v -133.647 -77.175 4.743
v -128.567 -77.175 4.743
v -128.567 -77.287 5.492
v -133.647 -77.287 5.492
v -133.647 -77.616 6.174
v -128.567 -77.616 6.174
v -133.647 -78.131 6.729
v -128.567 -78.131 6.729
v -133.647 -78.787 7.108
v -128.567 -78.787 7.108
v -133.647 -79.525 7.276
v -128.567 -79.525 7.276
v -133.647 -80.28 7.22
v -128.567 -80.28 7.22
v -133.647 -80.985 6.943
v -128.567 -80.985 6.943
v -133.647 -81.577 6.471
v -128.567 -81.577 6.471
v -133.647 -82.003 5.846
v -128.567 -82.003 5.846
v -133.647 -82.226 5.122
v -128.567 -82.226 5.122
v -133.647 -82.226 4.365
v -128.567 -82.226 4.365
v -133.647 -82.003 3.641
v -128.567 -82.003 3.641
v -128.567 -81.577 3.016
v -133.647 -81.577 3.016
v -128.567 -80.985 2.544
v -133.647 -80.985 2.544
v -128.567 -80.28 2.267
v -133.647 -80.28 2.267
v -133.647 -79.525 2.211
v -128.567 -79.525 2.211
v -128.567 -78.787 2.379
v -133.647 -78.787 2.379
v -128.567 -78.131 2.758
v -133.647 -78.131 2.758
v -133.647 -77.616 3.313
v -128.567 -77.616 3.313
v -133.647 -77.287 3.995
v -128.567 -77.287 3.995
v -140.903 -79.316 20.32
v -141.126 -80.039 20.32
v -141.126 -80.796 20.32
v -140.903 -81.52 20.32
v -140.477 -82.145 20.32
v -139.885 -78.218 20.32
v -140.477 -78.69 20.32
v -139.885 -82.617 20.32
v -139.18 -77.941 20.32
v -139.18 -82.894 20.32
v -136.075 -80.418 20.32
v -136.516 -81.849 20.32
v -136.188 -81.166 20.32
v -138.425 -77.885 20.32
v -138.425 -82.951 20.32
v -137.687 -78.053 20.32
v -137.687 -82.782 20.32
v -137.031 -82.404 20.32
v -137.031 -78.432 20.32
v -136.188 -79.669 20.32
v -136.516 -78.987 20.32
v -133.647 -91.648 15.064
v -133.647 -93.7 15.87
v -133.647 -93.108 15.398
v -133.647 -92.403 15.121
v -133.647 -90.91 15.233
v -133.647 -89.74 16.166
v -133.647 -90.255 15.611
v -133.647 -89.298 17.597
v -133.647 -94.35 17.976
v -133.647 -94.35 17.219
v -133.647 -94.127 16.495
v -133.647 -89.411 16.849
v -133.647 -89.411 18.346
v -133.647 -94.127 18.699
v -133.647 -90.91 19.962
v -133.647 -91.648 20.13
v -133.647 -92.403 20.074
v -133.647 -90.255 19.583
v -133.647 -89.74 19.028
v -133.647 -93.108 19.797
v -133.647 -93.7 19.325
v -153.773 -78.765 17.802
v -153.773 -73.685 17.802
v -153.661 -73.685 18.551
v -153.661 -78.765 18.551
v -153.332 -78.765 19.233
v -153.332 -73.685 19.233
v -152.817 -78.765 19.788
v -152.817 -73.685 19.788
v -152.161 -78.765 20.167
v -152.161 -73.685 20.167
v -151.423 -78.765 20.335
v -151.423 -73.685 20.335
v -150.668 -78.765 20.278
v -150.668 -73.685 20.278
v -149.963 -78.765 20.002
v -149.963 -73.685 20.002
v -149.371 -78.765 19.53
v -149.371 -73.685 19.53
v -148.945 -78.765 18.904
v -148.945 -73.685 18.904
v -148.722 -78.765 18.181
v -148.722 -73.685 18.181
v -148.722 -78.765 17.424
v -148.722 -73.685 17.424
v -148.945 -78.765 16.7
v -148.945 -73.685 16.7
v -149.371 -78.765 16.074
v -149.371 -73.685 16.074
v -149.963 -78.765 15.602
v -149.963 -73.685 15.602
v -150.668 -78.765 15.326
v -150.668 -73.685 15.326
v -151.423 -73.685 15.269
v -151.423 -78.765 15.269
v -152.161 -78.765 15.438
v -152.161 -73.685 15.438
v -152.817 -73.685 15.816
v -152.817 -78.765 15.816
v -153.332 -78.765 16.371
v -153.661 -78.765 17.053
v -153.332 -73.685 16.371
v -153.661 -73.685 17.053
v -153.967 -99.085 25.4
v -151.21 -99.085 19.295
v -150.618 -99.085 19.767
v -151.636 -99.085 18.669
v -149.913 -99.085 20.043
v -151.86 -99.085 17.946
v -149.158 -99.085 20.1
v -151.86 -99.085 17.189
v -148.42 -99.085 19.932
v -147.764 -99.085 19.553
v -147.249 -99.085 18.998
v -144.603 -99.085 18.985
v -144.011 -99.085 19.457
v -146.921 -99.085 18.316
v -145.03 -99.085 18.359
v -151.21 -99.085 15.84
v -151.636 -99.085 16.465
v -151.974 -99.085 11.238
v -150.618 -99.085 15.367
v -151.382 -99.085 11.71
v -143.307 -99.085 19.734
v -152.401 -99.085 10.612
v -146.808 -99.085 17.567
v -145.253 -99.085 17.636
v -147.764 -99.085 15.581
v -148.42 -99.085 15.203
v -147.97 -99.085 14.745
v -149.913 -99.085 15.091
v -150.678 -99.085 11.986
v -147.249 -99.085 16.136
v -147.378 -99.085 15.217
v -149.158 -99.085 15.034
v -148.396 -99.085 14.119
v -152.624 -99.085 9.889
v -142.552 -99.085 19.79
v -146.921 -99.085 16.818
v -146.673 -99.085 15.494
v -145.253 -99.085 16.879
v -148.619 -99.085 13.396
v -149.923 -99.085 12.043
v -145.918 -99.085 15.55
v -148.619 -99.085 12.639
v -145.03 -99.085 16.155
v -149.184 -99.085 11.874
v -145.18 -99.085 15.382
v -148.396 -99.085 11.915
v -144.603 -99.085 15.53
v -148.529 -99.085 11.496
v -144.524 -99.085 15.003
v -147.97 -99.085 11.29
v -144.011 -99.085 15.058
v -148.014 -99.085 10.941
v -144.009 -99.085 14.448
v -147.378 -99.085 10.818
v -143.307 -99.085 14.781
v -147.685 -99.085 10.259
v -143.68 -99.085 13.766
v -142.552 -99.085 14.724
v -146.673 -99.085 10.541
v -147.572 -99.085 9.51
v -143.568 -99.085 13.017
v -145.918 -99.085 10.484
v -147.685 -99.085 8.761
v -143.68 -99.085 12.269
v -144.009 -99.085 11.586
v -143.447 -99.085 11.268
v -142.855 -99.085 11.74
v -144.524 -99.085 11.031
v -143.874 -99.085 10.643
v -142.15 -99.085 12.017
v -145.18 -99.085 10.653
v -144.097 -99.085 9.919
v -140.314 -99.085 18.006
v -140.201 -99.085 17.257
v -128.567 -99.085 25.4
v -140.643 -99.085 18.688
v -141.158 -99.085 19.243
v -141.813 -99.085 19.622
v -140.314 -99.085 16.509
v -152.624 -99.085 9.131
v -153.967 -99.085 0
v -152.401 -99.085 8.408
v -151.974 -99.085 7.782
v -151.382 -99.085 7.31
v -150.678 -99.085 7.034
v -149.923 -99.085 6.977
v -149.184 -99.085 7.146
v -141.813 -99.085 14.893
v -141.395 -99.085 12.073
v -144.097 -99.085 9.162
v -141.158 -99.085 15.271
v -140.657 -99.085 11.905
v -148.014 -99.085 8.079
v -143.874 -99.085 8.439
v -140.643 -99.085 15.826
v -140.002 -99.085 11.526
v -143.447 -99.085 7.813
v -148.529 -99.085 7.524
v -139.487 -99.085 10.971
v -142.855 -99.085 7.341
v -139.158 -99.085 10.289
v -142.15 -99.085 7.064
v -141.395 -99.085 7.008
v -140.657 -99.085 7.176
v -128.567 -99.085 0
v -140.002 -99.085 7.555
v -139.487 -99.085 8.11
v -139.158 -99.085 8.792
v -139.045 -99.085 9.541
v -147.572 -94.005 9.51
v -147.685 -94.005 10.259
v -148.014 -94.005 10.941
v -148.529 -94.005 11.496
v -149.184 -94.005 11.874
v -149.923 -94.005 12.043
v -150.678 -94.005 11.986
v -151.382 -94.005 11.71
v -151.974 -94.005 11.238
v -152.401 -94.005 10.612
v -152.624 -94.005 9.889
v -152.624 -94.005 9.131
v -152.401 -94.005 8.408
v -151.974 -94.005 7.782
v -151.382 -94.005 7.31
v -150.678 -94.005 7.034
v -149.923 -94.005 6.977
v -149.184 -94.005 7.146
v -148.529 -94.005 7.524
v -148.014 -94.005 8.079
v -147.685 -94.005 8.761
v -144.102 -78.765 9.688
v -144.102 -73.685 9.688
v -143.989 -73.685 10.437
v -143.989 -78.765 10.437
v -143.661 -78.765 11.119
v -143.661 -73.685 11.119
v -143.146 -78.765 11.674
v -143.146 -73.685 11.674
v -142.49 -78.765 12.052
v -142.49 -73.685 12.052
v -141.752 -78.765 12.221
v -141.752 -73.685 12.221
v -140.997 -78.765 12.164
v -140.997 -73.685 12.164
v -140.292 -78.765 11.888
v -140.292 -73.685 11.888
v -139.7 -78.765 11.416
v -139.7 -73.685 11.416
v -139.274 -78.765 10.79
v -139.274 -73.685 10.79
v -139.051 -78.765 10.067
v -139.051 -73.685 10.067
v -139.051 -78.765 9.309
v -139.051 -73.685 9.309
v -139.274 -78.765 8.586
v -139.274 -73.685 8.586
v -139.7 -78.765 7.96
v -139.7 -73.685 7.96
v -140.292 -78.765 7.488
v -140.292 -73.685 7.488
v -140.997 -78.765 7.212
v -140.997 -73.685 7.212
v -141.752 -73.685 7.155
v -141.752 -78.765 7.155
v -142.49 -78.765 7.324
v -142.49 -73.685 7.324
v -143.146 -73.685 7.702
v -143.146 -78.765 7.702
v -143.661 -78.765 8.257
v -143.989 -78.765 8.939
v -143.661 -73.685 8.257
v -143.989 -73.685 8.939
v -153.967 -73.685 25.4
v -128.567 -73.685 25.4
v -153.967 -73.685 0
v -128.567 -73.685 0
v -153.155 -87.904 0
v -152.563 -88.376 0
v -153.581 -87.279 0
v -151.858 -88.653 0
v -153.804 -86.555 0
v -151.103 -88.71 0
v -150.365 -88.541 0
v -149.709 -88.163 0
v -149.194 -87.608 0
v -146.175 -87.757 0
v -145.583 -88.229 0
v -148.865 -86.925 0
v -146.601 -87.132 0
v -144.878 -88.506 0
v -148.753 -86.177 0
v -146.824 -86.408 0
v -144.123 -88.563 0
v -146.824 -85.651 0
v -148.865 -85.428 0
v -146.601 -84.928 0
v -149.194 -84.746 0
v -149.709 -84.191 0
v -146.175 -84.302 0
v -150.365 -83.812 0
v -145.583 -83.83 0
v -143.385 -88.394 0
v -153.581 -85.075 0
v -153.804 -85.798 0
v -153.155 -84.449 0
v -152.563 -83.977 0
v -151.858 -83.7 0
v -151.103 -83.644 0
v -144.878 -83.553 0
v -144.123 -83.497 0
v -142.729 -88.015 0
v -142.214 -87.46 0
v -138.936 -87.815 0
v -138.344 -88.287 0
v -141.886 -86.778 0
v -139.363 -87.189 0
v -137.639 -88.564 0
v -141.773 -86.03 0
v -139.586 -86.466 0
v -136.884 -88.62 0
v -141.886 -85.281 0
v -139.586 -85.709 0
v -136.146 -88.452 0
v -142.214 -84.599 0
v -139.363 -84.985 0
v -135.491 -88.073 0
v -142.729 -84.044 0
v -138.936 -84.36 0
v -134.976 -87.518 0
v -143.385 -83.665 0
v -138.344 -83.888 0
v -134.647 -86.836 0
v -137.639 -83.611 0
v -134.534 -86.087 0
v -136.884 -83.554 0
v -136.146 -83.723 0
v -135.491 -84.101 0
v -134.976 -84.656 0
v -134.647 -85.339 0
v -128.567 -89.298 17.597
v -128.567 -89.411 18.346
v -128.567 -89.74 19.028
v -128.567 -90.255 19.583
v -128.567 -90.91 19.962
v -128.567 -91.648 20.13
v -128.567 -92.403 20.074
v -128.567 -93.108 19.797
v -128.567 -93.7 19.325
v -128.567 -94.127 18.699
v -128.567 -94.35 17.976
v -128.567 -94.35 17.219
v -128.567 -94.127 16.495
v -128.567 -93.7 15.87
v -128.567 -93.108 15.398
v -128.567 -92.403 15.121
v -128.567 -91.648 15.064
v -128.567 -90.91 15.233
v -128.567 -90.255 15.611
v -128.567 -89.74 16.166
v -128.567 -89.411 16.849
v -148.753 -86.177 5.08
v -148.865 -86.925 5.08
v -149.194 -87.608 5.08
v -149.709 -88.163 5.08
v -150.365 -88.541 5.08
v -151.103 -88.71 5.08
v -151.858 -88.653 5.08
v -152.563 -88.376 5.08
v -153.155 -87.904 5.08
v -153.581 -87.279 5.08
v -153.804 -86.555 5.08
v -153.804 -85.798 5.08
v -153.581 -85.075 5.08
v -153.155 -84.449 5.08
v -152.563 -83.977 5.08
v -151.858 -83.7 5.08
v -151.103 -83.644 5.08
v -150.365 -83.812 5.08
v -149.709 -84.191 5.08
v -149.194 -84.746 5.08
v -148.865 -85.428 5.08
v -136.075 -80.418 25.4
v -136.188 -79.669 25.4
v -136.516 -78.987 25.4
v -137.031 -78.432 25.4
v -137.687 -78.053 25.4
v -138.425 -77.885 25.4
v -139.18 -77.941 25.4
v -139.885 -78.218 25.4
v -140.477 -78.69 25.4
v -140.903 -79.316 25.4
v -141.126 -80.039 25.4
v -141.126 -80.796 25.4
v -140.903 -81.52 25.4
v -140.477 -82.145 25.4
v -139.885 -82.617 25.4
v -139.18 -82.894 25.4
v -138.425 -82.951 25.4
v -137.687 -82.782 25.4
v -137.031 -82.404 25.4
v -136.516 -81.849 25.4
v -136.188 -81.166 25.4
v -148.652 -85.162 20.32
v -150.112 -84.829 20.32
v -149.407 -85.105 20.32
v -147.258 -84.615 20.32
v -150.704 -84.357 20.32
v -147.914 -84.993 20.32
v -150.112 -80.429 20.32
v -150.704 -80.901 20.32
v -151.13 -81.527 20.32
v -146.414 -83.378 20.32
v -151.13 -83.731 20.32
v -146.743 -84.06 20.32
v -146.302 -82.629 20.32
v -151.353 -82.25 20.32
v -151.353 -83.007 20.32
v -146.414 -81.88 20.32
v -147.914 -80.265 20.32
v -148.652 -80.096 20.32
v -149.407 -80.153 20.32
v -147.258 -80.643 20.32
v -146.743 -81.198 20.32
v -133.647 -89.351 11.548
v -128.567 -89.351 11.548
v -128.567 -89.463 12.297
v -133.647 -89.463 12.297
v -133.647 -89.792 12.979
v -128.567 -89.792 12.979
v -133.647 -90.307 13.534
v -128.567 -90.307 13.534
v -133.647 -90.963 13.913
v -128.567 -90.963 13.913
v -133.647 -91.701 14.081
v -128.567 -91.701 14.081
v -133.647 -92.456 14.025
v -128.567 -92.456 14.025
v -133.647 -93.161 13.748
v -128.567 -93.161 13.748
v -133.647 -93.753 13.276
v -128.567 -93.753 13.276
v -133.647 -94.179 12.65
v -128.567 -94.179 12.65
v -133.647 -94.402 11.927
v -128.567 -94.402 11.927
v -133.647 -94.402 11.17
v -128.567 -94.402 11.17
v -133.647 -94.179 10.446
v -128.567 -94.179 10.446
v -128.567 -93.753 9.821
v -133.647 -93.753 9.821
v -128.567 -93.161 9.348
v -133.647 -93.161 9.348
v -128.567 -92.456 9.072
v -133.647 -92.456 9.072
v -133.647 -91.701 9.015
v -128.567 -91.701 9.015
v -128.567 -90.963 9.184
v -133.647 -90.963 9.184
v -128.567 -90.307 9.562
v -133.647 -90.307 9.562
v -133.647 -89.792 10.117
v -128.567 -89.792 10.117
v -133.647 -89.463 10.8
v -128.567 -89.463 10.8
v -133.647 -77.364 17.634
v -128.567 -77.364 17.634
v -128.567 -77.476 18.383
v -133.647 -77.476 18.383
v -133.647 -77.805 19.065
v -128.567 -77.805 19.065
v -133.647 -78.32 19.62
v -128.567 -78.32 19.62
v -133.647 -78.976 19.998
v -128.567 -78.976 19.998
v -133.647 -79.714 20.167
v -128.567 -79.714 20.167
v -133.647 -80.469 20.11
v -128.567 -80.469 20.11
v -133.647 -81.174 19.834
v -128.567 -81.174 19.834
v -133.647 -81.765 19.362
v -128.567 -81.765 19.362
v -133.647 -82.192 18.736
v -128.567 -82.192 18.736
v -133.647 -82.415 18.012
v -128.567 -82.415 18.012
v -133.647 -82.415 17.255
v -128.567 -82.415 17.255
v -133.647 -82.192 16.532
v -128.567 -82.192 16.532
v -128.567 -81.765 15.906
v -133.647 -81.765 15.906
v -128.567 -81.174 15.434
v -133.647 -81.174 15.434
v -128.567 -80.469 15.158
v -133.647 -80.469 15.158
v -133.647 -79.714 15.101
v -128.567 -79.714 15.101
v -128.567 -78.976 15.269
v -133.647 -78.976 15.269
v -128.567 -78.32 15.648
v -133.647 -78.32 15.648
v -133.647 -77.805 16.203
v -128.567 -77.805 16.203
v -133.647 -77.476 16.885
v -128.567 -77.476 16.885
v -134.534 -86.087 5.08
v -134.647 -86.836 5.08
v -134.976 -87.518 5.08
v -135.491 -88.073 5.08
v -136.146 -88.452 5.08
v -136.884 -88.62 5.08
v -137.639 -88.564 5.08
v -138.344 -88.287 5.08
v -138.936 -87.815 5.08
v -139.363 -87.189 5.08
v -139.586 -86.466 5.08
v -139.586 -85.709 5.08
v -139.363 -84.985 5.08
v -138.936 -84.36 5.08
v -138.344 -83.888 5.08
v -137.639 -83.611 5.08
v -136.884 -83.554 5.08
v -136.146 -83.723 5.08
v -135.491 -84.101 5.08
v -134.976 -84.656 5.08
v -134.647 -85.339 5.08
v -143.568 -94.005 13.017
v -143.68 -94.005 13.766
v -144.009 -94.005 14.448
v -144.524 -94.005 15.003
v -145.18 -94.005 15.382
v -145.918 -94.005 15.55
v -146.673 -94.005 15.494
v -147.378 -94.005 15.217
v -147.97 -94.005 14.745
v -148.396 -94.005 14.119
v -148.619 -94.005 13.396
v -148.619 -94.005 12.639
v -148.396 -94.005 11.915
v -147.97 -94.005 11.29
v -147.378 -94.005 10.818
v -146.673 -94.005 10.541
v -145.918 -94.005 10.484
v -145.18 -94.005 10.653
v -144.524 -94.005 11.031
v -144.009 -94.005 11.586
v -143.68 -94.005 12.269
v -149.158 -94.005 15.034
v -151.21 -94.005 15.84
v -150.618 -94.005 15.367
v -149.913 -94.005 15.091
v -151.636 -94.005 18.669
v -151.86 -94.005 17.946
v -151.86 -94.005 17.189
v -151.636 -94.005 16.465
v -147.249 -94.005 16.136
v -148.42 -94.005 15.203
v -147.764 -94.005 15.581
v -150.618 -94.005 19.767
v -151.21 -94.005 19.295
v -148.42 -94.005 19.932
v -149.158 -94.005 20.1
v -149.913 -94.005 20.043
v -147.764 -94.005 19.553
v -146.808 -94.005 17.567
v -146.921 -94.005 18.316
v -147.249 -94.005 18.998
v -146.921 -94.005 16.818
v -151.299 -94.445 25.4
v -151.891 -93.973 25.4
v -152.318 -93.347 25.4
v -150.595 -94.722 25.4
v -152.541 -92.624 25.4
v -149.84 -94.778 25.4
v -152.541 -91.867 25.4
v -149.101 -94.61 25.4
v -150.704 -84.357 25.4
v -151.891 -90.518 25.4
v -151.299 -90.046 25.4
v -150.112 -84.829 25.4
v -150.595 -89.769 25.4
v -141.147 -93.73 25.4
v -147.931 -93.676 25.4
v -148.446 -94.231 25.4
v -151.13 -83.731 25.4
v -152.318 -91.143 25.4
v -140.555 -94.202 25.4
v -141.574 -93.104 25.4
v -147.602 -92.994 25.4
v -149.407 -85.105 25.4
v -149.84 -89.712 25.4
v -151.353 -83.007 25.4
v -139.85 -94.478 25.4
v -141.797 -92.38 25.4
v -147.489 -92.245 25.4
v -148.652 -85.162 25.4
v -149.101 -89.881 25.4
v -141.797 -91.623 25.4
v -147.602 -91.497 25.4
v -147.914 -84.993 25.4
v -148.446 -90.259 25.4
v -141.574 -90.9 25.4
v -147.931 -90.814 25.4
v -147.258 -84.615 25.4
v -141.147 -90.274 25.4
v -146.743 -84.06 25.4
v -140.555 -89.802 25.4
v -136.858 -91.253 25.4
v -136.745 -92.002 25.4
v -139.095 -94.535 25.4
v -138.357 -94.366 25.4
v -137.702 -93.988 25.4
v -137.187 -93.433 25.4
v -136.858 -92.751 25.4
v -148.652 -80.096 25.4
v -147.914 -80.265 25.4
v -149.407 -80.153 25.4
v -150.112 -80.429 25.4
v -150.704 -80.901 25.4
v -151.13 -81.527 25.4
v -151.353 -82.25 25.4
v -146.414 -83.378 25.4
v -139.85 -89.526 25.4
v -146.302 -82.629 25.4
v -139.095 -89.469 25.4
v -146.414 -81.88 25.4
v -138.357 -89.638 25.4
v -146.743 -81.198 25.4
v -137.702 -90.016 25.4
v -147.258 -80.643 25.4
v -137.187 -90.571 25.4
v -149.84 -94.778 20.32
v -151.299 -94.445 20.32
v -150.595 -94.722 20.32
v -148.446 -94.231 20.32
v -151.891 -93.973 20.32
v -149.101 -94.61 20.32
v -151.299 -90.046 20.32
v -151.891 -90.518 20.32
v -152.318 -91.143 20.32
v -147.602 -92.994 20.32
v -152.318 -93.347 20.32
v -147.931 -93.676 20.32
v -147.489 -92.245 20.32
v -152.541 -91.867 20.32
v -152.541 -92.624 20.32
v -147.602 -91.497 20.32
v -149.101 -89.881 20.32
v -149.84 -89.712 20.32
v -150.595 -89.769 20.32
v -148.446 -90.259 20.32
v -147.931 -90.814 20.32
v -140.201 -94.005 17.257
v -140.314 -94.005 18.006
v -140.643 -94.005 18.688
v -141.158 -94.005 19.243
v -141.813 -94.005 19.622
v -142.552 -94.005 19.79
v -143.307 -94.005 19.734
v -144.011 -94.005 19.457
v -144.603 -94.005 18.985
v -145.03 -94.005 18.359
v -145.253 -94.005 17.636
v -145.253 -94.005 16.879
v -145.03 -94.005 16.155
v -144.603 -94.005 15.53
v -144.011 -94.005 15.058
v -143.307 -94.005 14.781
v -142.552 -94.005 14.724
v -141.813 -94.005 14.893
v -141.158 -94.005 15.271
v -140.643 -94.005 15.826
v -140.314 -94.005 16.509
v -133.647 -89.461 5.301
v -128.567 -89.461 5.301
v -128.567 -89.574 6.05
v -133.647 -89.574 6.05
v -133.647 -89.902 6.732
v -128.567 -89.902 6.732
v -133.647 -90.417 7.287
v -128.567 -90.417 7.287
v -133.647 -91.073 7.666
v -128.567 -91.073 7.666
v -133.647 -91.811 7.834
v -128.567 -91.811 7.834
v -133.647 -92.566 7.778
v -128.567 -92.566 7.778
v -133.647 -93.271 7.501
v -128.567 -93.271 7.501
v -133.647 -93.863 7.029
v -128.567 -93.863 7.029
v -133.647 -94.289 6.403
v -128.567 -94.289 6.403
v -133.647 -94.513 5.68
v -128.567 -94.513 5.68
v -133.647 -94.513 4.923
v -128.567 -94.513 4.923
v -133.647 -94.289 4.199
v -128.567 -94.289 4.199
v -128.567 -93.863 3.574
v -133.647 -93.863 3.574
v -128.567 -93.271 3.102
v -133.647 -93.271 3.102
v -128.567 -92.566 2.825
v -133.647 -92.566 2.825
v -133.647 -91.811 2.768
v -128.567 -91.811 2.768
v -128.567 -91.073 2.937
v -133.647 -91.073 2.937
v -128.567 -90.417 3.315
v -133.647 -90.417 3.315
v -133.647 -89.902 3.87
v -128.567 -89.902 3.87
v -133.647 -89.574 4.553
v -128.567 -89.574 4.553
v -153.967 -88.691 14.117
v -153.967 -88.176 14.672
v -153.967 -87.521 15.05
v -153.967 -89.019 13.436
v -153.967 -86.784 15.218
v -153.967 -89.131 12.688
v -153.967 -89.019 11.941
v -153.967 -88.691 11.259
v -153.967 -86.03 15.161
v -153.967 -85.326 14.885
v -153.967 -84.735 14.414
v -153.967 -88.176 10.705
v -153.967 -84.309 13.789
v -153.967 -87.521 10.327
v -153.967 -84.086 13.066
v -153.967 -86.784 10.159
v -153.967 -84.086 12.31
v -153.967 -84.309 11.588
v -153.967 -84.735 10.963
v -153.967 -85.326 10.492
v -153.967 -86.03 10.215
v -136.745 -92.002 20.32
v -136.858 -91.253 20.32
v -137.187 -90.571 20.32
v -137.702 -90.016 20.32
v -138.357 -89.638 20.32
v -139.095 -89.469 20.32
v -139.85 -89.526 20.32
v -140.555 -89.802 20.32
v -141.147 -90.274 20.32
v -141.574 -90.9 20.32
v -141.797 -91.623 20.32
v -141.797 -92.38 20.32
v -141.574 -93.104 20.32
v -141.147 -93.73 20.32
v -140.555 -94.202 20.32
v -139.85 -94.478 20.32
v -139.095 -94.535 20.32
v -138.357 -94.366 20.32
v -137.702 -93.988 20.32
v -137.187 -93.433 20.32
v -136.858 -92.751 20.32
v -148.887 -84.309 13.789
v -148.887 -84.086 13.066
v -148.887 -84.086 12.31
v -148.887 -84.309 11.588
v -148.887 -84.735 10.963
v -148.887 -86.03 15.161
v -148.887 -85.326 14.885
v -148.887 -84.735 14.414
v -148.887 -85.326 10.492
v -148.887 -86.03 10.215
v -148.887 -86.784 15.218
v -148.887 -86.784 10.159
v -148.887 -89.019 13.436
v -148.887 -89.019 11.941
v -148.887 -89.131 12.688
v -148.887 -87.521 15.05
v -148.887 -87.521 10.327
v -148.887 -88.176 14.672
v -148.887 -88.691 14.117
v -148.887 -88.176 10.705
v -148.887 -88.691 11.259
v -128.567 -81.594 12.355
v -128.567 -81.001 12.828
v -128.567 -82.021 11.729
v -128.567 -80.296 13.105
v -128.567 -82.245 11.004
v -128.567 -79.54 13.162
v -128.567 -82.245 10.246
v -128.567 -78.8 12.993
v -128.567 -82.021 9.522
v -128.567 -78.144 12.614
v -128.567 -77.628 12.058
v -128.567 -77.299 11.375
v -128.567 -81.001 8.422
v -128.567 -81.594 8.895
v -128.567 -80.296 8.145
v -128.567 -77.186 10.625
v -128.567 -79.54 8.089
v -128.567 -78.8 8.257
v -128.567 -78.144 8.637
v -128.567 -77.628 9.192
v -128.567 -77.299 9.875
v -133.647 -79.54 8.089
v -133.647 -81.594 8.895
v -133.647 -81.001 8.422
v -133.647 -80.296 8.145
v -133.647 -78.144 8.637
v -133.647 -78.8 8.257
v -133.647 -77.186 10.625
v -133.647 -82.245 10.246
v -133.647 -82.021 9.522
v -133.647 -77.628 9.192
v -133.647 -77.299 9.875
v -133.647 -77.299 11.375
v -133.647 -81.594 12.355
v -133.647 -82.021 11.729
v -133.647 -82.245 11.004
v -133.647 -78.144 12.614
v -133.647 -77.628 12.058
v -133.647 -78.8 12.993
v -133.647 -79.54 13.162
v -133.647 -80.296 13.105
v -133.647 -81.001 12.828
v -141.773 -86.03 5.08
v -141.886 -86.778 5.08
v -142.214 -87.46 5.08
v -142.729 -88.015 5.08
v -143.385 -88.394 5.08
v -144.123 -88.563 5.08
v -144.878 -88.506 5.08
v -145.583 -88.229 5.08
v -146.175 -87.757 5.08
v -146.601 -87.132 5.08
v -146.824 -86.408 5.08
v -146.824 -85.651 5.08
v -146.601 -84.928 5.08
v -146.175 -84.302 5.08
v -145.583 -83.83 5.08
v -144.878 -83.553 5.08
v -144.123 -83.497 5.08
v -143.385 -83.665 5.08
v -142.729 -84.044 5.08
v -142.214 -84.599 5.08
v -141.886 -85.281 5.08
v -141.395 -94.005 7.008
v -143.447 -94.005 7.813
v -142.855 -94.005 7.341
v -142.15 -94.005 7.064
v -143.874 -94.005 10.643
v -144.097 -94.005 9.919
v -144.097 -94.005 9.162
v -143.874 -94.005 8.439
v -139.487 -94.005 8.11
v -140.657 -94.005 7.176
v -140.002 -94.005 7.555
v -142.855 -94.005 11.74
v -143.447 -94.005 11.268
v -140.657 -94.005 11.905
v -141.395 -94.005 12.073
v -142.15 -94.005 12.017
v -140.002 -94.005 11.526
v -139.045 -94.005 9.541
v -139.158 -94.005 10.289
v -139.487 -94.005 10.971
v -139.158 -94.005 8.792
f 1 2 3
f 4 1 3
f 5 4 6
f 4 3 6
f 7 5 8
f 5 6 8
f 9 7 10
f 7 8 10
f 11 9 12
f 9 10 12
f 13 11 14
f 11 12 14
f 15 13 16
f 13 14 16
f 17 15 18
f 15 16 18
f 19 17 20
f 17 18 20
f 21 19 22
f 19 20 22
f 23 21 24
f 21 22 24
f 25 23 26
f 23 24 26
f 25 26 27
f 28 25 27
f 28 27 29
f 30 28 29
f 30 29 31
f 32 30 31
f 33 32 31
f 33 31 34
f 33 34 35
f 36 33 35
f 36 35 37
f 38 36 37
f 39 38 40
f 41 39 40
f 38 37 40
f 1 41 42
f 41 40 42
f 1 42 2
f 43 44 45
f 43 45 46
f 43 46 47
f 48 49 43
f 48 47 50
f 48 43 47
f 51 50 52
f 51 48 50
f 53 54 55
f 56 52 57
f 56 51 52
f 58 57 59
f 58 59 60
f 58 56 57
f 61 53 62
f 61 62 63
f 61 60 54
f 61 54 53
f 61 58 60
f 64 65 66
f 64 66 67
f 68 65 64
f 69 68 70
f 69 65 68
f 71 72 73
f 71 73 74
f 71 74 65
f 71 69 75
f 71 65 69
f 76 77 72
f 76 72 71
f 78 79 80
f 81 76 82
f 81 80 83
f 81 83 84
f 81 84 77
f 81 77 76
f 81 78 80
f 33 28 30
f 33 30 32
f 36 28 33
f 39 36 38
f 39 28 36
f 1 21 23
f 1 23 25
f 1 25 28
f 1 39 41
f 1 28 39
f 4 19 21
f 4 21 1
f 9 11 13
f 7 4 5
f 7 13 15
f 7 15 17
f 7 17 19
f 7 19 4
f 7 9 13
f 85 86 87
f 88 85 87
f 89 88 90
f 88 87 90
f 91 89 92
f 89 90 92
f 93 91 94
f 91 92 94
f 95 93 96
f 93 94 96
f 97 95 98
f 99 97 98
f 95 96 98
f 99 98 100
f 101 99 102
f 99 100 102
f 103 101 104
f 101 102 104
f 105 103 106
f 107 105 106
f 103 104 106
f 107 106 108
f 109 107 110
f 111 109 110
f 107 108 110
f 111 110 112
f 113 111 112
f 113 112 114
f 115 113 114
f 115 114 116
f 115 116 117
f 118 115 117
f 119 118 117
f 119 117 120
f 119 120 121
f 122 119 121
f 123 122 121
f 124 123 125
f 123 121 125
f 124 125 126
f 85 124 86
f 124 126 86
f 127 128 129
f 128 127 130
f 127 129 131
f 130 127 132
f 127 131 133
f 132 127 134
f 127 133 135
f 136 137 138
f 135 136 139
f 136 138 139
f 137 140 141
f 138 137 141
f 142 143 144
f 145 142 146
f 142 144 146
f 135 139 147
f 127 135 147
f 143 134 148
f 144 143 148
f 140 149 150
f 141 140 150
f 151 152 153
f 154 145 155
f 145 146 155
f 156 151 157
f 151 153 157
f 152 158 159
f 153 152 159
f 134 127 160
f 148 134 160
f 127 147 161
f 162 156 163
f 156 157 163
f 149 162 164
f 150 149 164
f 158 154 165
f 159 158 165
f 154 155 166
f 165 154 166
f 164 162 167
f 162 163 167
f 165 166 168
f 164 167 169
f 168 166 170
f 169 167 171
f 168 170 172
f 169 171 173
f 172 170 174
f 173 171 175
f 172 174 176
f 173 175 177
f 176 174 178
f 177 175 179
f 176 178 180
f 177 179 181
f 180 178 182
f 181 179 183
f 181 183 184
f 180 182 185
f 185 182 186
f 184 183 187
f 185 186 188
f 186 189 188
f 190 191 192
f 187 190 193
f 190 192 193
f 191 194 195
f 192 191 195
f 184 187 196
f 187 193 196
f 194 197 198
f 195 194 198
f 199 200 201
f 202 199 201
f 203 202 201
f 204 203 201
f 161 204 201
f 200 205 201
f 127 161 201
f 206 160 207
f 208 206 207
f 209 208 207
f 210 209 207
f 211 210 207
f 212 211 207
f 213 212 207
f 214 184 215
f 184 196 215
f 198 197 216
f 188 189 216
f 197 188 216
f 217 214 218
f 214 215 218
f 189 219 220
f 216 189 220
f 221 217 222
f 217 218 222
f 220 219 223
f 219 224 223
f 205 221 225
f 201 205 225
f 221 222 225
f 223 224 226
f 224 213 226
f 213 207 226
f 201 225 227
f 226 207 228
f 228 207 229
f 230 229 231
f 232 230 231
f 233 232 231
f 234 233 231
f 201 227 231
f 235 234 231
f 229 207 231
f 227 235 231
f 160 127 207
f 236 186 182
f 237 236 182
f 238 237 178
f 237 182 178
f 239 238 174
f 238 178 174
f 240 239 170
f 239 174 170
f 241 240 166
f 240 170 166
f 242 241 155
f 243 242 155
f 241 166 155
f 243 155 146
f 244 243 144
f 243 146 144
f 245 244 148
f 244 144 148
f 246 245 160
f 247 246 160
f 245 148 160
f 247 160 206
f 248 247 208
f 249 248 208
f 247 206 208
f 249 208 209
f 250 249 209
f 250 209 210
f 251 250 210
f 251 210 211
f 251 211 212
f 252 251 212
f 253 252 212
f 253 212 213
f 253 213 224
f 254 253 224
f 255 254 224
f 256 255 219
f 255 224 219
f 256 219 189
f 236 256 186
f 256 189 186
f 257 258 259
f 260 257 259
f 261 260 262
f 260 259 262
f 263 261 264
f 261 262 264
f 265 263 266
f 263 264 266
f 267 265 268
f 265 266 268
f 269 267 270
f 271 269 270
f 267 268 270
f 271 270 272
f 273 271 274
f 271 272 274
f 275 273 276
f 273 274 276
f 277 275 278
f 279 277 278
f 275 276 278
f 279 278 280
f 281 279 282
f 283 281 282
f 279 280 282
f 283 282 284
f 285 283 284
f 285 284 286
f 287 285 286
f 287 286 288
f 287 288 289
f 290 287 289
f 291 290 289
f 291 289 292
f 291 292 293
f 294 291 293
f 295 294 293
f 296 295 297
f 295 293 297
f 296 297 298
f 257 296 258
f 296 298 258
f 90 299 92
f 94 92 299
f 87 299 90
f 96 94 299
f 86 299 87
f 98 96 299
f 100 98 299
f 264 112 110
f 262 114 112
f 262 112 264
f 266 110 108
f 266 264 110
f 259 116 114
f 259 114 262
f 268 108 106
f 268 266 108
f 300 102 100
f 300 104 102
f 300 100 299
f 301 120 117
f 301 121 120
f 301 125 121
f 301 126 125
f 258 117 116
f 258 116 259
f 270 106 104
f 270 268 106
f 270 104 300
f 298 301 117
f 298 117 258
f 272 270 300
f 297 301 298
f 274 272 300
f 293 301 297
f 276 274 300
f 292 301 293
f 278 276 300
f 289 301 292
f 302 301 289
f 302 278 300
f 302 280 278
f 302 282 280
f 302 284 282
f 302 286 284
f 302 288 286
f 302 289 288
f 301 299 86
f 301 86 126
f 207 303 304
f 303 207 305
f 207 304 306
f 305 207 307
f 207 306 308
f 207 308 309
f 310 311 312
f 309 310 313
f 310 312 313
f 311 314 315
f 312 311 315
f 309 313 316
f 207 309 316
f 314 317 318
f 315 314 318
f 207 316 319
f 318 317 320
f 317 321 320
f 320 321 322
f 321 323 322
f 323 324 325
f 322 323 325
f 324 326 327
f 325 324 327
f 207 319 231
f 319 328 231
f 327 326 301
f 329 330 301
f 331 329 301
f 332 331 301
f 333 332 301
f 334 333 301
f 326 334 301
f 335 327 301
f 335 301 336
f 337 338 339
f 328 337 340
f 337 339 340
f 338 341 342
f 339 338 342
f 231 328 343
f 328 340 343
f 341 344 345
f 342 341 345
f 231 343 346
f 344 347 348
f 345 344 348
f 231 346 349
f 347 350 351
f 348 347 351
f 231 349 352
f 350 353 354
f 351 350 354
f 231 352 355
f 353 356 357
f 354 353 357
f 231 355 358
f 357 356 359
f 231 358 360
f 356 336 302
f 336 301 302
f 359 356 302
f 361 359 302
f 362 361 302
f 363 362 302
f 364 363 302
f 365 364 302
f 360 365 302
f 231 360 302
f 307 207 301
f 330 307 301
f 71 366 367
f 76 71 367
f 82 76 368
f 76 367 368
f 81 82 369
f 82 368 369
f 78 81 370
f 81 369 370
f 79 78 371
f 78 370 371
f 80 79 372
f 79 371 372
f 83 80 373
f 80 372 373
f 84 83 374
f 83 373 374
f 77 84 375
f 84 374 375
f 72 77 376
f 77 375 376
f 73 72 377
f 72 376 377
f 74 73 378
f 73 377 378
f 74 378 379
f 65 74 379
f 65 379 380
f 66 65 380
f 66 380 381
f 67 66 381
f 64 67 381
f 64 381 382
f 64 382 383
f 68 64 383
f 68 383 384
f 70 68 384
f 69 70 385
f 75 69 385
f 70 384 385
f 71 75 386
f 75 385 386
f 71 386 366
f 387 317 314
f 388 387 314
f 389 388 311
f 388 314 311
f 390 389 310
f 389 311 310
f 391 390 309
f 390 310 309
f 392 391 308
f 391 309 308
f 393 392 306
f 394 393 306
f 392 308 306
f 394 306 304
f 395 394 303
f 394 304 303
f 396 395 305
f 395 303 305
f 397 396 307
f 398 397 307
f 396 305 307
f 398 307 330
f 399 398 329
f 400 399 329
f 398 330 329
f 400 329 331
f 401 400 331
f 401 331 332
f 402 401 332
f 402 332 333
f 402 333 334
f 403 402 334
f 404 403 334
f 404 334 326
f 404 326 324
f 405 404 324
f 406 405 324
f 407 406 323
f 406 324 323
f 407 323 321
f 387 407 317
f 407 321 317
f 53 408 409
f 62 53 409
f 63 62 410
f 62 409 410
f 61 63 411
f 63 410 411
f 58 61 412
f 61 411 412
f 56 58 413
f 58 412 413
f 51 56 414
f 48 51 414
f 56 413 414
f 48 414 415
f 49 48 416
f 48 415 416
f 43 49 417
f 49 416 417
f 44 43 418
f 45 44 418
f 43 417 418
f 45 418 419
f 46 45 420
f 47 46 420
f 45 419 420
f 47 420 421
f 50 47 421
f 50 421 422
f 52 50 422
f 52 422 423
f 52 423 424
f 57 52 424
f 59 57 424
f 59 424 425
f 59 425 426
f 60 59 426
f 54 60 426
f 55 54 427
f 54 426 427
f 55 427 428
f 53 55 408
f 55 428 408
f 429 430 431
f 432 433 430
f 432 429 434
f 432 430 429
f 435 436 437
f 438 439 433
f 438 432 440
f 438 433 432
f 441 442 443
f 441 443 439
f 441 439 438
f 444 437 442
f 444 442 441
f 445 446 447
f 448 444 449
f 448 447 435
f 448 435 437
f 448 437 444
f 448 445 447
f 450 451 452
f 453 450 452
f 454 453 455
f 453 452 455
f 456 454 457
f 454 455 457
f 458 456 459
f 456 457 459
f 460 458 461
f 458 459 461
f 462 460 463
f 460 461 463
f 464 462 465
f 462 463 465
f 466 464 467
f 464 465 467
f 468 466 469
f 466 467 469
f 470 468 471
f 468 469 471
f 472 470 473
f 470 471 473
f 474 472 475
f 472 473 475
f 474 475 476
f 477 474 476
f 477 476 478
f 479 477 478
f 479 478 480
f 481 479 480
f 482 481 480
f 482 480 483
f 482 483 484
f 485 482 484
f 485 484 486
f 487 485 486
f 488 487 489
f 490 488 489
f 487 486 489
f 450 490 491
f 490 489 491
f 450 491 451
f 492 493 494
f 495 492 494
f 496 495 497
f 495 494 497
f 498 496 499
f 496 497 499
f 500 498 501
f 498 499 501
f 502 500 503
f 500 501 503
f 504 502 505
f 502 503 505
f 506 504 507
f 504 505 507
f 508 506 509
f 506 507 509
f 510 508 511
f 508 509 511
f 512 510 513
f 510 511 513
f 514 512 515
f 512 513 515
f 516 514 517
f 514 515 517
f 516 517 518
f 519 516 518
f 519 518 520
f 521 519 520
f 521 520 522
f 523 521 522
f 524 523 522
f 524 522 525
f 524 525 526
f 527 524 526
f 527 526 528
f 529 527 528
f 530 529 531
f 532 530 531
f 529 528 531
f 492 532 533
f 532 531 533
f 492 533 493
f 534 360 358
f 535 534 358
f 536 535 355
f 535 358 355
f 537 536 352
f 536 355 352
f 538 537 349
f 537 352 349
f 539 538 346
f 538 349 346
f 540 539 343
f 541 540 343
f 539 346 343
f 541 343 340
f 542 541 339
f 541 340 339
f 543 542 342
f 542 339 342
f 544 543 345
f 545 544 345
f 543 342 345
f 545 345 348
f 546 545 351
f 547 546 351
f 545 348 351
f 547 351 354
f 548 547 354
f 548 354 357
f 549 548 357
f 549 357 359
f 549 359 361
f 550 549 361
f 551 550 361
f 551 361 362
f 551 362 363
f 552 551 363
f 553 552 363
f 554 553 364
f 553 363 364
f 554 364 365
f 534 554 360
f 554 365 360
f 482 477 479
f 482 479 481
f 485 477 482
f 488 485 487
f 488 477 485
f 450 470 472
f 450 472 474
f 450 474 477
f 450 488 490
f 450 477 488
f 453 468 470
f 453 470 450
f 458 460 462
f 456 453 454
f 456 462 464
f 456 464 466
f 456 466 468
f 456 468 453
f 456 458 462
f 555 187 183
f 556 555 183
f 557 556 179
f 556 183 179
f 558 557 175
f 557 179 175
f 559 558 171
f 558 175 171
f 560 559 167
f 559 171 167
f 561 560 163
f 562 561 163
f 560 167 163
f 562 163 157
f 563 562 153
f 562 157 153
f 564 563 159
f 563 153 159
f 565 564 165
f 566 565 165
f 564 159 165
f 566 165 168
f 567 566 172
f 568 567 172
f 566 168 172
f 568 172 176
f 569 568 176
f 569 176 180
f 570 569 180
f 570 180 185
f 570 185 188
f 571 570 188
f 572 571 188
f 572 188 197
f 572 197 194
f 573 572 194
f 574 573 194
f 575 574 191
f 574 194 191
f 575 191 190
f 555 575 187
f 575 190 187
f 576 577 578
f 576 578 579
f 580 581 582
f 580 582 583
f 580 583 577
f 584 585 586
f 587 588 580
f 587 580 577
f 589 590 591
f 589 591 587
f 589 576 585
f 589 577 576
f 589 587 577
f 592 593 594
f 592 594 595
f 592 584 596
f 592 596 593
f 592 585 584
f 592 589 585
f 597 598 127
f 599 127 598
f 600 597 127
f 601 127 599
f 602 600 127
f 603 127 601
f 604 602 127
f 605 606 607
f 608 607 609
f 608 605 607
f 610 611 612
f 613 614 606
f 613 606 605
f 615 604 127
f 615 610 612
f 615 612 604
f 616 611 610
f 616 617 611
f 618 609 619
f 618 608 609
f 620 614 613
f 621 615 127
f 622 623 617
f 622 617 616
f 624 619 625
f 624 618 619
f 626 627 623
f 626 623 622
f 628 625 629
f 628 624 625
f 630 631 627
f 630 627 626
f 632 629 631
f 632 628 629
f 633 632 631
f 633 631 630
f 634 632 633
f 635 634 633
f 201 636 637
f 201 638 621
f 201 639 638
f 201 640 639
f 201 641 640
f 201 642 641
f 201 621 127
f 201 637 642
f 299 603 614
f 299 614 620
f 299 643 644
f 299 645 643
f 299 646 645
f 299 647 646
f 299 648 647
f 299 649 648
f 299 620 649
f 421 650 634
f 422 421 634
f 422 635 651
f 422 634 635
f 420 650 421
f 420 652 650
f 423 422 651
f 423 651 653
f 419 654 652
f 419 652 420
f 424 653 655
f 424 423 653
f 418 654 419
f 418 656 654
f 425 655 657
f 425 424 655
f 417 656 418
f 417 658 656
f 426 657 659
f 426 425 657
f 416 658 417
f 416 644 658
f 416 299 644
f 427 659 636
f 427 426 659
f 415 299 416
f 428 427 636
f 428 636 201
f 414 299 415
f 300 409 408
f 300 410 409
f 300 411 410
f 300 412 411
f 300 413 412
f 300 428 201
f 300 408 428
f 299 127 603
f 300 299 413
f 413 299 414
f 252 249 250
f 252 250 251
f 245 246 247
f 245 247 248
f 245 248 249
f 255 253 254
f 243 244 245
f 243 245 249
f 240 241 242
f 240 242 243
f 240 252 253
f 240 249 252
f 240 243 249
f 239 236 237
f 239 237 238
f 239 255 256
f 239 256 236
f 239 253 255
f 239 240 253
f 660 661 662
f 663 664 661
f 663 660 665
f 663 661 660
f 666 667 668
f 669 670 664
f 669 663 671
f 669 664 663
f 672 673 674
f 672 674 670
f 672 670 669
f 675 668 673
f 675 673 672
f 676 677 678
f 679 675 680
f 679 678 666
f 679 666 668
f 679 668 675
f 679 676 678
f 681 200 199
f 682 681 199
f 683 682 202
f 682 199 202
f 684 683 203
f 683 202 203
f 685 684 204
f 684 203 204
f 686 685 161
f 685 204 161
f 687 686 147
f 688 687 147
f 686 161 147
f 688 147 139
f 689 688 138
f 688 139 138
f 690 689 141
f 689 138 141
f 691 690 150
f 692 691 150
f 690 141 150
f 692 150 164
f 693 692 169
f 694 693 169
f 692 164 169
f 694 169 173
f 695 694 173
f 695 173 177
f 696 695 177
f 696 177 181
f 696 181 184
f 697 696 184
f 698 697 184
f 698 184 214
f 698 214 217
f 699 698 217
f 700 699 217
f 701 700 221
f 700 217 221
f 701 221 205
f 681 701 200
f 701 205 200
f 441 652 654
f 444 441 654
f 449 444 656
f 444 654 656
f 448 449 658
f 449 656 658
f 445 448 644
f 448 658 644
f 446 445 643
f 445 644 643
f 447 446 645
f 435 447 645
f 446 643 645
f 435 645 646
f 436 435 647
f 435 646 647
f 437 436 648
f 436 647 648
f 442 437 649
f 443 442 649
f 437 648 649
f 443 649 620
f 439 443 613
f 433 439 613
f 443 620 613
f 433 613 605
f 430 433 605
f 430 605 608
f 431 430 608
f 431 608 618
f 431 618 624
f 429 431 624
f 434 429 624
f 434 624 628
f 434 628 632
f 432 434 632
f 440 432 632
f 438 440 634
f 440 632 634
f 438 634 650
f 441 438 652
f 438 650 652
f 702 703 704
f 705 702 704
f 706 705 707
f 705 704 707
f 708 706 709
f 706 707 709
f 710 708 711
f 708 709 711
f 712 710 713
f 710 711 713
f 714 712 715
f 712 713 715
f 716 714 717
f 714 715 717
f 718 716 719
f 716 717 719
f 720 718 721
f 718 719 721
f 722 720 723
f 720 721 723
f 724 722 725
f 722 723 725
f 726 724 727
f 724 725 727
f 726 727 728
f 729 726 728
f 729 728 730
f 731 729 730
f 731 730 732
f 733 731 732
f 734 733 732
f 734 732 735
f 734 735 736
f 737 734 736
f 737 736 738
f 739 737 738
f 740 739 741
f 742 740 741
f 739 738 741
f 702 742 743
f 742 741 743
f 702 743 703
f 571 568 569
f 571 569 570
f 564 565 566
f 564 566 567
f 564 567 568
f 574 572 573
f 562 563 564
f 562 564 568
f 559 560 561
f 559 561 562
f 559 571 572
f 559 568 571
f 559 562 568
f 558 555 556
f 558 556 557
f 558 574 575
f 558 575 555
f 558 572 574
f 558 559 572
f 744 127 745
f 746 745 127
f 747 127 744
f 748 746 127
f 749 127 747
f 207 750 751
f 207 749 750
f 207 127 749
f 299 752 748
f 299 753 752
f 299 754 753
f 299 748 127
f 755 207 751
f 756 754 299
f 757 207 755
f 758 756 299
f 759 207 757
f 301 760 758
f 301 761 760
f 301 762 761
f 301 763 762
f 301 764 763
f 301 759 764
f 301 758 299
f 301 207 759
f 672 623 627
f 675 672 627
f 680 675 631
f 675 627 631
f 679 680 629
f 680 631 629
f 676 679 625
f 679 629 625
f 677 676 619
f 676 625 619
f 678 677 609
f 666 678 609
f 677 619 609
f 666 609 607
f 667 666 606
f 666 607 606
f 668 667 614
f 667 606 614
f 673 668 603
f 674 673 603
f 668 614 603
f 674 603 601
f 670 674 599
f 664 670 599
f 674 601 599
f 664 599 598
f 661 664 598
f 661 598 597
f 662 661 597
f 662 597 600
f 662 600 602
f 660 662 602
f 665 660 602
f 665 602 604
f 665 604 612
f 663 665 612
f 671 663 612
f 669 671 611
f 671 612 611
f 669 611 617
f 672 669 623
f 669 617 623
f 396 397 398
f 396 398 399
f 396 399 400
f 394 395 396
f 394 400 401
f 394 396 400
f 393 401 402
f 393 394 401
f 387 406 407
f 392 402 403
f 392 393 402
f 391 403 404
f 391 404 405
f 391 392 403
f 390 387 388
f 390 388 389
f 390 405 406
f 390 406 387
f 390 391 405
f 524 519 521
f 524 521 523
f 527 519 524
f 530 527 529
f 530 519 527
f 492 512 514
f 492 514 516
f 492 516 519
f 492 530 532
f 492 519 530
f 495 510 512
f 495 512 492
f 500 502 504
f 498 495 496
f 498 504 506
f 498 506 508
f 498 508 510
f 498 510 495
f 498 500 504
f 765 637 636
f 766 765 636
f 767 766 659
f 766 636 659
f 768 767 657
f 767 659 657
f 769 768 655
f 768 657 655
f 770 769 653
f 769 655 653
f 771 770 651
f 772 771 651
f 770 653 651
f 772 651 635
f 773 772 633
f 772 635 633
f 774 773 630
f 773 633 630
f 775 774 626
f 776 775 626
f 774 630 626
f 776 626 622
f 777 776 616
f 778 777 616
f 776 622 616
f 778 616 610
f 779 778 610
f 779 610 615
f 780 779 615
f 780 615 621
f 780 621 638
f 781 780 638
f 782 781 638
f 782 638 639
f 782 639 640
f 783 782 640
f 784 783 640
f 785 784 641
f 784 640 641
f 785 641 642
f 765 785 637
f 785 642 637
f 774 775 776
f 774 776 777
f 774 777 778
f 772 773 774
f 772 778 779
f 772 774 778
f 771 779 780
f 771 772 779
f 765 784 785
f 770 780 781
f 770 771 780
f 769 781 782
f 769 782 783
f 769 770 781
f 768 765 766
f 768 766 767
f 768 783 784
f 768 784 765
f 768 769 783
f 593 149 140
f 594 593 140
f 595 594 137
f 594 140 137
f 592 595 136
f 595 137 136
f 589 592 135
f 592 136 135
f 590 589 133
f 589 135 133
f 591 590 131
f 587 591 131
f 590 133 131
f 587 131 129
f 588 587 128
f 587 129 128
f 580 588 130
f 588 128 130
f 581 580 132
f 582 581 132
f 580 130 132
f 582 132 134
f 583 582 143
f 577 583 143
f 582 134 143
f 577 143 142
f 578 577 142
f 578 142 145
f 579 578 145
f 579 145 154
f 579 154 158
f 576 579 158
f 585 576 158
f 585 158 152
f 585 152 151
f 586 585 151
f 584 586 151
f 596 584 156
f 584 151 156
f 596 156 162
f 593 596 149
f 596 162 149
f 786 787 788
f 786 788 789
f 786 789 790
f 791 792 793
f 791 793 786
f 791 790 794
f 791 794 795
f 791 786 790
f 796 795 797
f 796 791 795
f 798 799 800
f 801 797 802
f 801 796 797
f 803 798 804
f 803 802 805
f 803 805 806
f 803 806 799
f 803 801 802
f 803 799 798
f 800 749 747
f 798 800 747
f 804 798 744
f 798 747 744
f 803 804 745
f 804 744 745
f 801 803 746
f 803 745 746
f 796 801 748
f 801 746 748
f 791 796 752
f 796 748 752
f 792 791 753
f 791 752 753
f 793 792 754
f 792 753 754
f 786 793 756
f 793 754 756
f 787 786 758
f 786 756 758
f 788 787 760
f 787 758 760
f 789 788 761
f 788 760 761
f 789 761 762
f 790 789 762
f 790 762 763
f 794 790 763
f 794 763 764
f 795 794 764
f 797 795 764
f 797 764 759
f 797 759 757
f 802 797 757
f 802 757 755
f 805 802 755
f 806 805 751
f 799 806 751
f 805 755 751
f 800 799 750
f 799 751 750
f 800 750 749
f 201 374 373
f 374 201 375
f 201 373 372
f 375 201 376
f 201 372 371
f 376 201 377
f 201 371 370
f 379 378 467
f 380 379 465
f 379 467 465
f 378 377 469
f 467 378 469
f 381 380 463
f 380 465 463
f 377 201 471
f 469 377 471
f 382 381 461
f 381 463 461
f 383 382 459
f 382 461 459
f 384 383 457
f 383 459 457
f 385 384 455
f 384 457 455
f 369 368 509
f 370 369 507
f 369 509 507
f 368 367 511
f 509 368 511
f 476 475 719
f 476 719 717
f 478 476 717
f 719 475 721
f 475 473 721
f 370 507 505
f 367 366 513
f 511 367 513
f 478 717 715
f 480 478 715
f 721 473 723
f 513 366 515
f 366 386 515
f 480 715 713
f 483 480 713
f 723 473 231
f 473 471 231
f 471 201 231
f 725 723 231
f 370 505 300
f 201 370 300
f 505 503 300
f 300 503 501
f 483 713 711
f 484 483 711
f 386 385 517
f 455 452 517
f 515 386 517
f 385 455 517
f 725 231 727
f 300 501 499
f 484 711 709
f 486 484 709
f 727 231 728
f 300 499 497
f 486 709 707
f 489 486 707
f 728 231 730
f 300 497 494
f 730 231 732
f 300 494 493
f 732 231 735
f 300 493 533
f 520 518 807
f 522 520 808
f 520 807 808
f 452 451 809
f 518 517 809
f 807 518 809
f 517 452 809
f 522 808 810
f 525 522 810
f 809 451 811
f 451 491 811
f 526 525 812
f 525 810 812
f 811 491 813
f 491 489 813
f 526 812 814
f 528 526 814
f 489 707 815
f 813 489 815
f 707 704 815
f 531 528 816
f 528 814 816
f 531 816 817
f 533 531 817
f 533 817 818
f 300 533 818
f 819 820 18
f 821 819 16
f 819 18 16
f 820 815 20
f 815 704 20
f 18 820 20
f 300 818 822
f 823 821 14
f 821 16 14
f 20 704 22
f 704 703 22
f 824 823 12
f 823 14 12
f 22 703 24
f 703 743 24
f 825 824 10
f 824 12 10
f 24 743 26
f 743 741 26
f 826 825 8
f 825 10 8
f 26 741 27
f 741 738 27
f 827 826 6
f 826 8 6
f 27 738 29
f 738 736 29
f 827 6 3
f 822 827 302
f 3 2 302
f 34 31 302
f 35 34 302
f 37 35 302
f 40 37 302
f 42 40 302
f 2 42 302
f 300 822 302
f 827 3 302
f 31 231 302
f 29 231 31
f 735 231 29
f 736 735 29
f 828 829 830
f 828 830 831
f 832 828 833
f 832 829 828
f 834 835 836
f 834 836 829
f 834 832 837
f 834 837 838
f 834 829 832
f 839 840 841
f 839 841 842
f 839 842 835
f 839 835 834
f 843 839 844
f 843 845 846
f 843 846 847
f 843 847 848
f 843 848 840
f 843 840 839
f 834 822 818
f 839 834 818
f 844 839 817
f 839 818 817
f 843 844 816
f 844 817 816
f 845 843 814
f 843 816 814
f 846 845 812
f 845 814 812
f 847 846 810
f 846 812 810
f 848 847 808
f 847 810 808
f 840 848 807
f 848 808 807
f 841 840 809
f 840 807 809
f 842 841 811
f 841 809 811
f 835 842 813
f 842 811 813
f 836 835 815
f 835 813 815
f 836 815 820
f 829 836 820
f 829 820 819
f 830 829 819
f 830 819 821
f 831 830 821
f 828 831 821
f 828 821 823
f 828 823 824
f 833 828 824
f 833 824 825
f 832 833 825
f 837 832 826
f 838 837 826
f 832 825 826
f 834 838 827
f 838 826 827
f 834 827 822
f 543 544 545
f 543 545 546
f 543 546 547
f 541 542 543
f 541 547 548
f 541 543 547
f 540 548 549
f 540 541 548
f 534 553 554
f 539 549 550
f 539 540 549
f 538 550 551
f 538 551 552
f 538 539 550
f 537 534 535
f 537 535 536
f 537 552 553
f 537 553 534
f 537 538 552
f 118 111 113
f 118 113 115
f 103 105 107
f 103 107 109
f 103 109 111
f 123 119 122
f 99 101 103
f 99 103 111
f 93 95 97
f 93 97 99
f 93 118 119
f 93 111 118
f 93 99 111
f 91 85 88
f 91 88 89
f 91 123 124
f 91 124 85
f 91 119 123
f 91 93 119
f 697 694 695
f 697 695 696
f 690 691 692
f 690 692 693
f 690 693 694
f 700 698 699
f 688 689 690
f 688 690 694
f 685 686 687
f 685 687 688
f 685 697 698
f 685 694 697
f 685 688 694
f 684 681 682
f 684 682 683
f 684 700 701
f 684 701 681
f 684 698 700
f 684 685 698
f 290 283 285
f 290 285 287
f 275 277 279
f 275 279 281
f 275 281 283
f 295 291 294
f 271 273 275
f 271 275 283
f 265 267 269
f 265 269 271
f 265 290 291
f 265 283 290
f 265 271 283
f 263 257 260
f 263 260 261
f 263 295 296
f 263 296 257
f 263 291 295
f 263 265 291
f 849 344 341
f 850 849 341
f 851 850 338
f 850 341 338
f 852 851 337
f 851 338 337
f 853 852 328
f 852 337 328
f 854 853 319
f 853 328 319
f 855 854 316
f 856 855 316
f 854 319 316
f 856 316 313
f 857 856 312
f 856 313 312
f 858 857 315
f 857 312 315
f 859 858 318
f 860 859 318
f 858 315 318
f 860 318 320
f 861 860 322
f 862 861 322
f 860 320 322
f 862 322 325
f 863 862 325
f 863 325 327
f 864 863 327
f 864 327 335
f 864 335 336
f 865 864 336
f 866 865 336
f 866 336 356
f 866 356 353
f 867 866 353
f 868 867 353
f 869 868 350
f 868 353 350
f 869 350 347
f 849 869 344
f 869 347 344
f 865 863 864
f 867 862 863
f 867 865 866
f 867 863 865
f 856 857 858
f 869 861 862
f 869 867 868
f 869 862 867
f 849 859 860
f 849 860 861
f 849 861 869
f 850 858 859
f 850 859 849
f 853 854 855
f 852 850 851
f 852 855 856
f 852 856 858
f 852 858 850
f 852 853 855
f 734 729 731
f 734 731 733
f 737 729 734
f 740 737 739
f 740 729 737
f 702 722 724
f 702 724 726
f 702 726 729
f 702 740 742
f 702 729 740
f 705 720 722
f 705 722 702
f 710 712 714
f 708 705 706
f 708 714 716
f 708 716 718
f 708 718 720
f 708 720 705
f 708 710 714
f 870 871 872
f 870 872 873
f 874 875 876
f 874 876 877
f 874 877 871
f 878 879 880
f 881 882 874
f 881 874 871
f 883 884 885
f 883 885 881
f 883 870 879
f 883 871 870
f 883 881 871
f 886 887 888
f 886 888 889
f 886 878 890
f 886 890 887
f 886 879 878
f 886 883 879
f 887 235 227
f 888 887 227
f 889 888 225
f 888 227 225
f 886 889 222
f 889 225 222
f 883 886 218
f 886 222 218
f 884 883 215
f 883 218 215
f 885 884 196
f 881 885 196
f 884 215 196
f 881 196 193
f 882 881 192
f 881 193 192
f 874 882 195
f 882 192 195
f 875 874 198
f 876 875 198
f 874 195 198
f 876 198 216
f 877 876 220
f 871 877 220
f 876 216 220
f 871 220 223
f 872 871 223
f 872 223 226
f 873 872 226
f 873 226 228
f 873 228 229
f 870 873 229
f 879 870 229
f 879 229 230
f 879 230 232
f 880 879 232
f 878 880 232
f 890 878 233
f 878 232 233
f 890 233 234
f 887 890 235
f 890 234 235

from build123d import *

# Parameters (mm, degrees)
F0_W      = 25.4
F0_H      = 25.4
F1_DEPTH  = 25.4
F2_R      = 2.53667
F3_DEPTH  = 5.08
F4_R      = 2.54
F5_DEPTH  = 5.08
F6_R      = 2.54
F7_DEPTH  = 5.08
F8_R      = 2.543532
F9_DEPTH  = 5.08
F10_R     = 2.54
F11_DEPTH = 5.08
F12_R     = 2.54
F13_DEPTH = 5.08
F14_R     = 2.54
F15_DEPTH = 5.08
F16_R     = 2.54
F18_DEPTH = 5.08
F17_R     = 2.54
F19_DEPTH = 5.08
F20_R     = 2.54
F24_DEPTH = 5.08
F23_R     = 2.54
F25_DEPTH = 5.08
F22_R     = 2.54
F26_DEPTH = 5.08
F21_R     = 2.54
F27_DEPTH = 5.08
F28_R     = 2.54
F29_DEPTH = 5.08
F31_R     = 2.54
F32_DEPTH = 5.08
F30_R     = 2.54
F33_DEPTH = 5.08
F34_R     = 2.54
F35_DEPTH = 5.08
F36_R     = 2.54
F37_DEPTH = 5.08
F38_R     = 2.54
F39_DEPTH = 5.08
F40_R     = 2.54
F41_DEPTH = 5.08
F42_R     = 2.54
F43_DEPTH = 5.08


with BuildPart() as f1:
    # F0 (on Top) → F1 (new body)
    with BuildSketch(Plane.XY):
        with Locations((-141.267316, -86.385182)):
            Rectangle(F0_W, F0_H)
    extrude(amount=F1_DEPTH)

    # F2 (on face) → F3 (cut)
    with BuildSketch(Plane(origin=(-153.967316, 0, 0), x_dir=(0, -1, 0), z_dir=(-1, 0, 0))):
        with Locations((86.594619, 12.688329)):
            Circle(F2_R)
    extrude(amount=-F3_DEPTH, mode=Mode.SUBTRACT)

    # F4 (on face) → F5 (cut)
    with BuildSketch(Plane.YZ.offset(-128.567316)):
        with Locations((-91.838241, 17.597279)):
            Circle(F4_R)
    extrude(amount=-F5_DEPTH, mode=Mode.SUBTRACT)

    # F6 (on face) → F7 (cut)
    with BuildSketch(Plane.YZ.offset(-128.567316)):
        with Locations((-79.903536, 17.633894)):
            Circle(F6_R)
    extrude(amount=-F7_DEPTH, mode=Mode.SUBTRACT)

    # F8 (on face) → F9 (cut)
    with BuildSketch(Plane.YZ.offset(-128.567316)):
        with Locations((-79.729639, 10.625202)):
            Circle(F8_R)
    extrude(amount=-F9_DEPTH, mode=Mode.SUBTRACT)

    # F10 (on face) → F11 (cut)
    with BuildSketch(Plane.YZ.offset(-128.567316)):
        with Locations((-91.890648, 11.548187)):
            Circle(F10_R)
    extrude(amount=-F11_DEPTH, mode=Mode.SUBTRACT)

    # F12 (on face) → F13 (cut)
    with BuildSketch(Plane.YZ.offset(-128.567316)):
        with Locations((-92.000924, 5.3013)):
            Circle(F12_R)
    extrude(amount=-F13_DEPTH, mode=Mode.SUBTRACT)

    # F14 (on face) → F15 (cut)
    with BuildSketch(Plane.YZ.offset(-128.567316)):
        with Locations((-79.714611, 4.743482)):
            Circle(F14_R)
    extrude(amount=-F15_DEPTH, mode=Mode.SUBTRACT)

    # F16 (on face) → F18 (cut)
    with BuildSketch(Plane(origin=(0, -73.685182, 0), x_dir=(-1, 0, 0), z_dir=(0, 1, 0))):
        with Locations((141.562238, 9.688065)):
            Circle(F16_R)
    extrude(amount=-F18_DEPTH, mode=Mode.SUBTRACT)

    # F17 (on face) → F19 (cut)
    with BuildSketch(Plane(origin=(0, -73.685182, 0), x_dir=(-1, 0, 0), z_dir=(0, 1, 0))):
        with Locations((151.23339, 17.802121)):
            Circle(F17_R)
    extrude(amount=-F19_DEPTH, mode=Mode.SUBTRACT)

    # F20 (on face) → F24 (cut)
    with BuildSketch(Plane.XY.offset(25.4)):
        with Locations((-139.285192, -92.00193)):
            Circle(F20_R)
    extrude(amount=-F24_DEPTH, mode=Mode.SUBTRACT)

    # F23 (on face) → F25 (cut)
    with BuildSketch(Plane.XY.offset(25.4)):
        with Locations((-150.029391, -92.245251)):
            Circle(F23_R)
    extrude(amount=-F25_DEPTH, mode=Mode.SUBTRACT)

    # F22 (on face) → F26 (cut)
    with BuildSketch(Plane.XY.offset(25.4)):
        with Locations((-138.614863, -80.417737)):
            Circle(F22_R)
    extrude(amount=-F26_DEPTH, mode=Mode.SUBTRACT)

    # F21 (on face) → F27 (cut)
    with BuildSketch(Plane.XY.offset(25.4)):
        with Locations((-148.84156, -82.628928)):
            Circle(F21_R)
    extrude(amount=-F27_DEPTH, mode=Mode.SUBTRACT)

    # F28 (on face) → F29 (cut)
    with BuildSketch(Plane(origin=(0, 0, 0), x_dir=(1, 0, 0), z_dir=(0, 0, -1))):
        with Locations((-137.074172, 86.087316)):
            Circle(F28_R)
    extrude(amount=-F29_DEPTH, mode=Mode.SUBTRACT)

    # F31 (on face) → F32 (cut)
    with BuildSketch(Plane(origin=(0, 0, 0), x_dir=(1, 0, 0), z_dir=(0, 0, -1))):
        with Locations((-151.292577, 86.176708)):
            Circle(F31_R)
    extrude(amount=-F32_DEPTH, mode=Mode.SUBTRACT)

    # F30 (on face) → F33 (cut)
    with BuildSketch(Plane(origin=(0, 0, 0), x_dir=(1, 0, 0), z_dir=(0, 0, -1))):
        with Locations((-144.312844, 86.029641)):
            Circle(F30_R)
    extrude(amount=-F33_DEPTH, mode=Mode.SUBTRACT)

    # F34 (on face) → F35 (cut)
    with BuildSketch(Plane.XZ.offset(99.085182)):
        with Locations((-142.741442, 17.257215)):
            Circle(F34_R)
    extrude(amount=-F35_DEPTH, mode=Mode.SUBTRACT)

    # F36 (on face) → F37 (cut)
    with BuildSketch(Plane.XZ.offset(99.085182)):
        with Locations((-146.107584, 13.017296)):
            Circle(F36_R)
    extrude(amount=-F37_DEPTH, mode=Mode.SUBTRACT)

    # F38 (on face) → F39 (cut)
    with BuildSketch(Plane.XZ.offset(99.085182)):
        with Locations((-141.585246, 9.540573)):
            Circle(F38_R)
    extrude(amount=-F39_DEPTH, mode=Mode.SUBTRACT)

    # F40 (on face) → F41 (cut)
    with BuildSketch(Plane.XZ.offset(99.085182)):
        with Locations((-149.347872, 17.567154)):
            Circle(F40_R)
    extrude(amount=-F41_DEPTH, mode=Mode.SUBTRACT)

    # F42 (on face) → F43 (cut)
    with BuildSketch(Plane.XZ.offset(99.085182)):
        with Locations((-150.112391, 9.50997)):
            Circle(F42_R)
    extrude(amount=-F43_DEPTH, mode=Mode.SUBTRACT)


solid = f1.part
